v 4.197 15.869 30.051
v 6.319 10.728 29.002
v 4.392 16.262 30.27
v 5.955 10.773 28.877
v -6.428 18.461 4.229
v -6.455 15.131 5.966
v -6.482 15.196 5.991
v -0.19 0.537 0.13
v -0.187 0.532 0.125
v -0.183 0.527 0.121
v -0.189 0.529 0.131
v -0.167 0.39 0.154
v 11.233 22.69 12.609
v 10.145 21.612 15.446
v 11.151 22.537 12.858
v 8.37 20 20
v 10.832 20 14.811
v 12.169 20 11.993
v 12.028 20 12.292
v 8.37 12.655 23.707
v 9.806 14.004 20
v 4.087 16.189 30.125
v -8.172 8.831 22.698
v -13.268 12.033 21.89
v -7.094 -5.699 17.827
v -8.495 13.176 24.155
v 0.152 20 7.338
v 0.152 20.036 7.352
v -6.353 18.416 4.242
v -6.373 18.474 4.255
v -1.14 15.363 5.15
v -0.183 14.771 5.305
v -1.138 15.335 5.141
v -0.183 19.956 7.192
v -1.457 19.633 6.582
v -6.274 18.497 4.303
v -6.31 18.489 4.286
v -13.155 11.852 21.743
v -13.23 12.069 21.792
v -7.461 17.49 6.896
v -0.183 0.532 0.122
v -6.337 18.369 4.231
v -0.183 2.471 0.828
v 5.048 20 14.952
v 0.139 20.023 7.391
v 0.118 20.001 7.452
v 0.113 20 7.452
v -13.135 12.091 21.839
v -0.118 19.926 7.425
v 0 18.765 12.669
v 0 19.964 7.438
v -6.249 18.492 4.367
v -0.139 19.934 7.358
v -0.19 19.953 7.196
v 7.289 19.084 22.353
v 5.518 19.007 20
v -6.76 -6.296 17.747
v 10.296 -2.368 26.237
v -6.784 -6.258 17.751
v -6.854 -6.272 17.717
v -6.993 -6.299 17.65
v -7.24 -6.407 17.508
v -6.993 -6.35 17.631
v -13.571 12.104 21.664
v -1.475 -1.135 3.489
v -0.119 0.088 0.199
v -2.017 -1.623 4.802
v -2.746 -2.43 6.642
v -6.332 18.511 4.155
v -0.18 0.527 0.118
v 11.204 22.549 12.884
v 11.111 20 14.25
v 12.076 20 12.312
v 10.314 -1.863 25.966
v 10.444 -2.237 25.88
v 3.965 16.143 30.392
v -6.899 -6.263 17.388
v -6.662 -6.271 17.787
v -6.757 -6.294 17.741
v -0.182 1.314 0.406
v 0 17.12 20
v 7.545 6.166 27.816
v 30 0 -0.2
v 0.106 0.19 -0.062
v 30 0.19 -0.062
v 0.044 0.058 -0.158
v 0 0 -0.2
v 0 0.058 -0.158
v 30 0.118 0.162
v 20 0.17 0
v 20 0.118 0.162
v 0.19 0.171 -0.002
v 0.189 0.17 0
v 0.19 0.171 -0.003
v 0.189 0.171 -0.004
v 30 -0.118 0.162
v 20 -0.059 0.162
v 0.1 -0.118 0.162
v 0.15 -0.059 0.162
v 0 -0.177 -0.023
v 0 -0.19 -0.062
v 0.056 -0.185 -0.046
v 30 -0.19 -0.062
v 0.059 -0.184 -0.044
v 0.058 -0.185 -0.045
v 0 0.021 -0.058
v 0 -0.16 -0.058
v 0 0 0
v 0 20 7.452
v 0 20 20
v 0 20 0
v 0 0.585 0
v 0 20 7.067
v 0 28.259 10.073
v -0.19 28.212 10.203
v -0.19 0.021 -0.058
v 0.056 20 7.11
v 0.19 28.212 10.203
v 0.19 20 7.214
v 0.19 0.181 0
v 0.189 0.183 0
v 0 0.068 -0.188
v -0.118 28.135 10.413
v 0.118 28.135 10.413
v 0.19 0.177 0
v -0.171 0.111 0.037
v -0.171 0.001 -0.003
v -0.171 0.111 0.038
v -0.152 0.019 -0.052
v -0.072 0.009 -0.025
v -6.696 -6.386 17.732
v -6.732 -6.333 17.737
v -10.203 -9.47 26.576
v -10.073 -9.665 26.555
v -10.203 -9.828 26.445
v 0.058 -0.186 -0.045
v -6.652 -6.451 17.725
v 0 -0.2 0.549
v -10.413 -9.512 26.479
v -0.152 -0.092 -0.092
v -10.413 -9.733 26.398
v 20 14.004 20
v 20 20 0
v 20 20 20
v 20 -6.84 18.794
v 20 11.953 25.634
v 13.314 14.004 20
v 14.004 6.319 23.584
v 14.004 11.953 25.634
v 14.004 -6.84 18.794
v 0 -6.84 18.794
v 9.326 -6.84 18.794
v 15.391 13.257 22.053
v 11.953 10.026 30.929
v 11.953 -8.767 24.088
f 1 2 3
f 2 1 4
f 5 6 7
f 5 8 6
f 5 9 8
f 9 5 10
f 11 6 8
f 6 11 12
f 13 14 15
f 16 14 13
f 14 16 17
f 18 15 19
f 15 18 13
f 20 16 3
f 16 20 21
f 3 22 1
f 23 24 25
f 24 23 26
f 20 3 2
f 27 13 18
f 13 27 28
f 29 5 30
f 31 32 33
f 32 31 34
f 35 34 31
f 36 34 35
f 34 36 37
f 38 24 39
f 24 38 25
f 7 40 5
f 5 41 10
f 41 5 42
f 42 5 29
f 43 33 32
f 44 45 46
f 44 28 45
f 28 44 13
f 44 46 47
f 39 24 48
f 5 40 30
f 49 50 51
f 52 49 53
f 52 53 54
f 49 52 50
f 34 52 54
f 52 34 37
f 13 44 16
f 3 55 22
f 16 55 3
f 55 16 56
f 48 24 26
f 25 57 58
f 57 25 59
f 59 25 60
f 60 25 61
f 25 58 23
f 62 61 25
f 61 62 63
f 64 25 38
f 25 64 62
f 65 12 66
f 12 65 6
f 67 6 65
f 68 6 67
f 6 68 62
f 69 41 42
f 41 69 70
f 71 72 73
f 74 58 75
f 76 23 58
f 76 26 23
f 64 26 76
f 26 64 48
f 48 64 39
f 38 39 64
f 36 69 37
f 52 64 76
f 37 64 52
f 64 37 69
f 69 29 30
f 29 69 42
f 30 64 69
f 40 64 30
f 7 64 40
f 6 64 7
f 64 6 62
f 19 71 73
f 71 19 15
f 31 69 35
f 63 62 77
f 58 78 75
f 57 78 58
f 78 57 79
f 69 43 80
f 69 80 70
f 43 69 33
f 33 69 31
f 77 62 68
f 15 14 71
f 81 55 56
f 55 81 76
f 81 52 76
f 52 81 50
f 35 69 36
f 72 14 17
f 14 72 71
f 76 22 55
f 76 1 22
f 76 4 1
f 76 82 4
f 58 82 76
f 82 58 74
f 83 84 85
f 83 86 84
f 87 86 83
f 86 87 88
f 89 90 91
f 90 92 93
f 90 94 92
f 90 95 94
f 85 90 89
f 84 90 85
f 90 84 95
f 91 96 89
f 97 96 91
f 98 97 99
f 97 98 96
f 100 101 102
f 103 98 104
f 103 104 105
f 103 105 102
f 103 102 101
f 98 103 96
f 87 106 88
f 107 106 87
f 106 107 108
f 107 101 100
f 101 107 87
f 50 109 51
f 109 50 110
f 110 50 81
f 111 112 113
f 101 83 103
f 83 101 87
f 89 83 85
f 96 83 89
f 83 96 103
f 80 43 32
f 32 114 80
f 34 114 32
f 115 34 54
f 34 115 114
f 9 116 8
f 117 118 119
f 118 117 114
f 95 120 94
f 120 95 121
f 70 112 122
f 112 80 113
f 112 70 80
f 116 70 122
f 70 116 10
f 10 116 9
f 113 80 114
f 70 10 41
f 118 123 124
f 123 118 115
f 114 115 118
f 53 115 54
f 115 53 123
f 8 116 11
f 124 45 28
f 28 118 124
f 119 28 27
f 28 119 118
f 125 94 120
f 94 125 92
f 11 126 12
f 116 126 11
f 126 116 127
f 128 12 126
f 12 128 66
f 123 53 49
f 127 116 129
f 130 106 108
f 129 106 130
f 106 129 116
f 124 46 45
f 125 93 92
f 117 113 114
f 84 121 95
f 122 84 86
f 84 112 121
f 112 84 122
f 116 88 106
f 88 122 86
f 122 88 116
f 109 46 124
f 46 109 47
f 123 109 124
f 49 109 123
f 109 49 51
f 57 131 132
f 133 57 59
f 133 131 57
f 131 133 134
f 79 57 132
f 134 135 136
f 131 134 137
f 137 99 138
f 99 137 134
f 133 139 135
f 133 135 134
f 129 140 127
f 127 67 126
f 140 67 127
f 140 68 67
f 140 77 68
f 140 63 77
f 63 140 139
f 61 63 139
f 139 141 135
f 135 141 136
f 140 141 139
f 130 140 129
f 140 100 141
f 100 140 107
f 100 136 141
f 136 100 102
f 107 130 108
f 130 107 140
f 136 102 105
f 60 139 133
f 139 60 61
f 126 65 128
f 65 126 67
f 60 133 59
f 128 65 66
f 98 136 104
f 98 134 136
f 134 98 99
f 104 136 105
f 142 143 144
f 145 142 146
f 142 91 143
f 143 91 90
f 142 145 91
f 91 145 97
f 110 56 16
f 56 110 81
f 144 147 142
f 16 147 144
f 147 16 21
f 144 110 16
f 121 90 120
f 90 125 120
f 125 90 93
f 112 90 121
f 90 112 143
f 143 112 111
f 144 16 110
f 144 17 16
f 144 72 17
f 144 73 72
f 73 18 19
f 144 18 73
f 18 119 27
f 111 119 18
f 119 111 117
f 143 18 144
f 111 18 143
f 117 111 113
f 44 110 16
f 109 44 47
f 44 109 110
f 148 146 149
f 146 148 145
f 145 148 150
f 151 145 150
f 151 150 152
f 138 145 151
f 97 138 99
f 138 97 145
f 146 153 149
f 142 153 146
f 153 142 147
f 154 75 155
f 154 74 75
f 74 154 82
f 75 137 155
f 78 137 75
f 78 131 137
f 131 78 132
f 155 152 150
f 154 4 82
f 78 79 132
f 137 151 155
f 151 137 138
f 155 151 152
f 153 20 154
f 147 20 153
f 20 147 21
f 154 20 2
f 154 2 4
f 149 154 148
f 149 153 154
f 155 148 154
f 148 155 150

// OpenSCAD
// file: config.scad
$fa = $preview ? 12 : 1;
$fs = $preview ? 2 : 0.4;

choc_key_x = 18;
choc_key_y = 17;
pcbAndHotswapThikness = 3;
caseThikness = 2.5;
wallOffsetFromPcb = 1;
wallOffsetFromConnector = 3;
tentingAngle = 60;
keysThikness = 11;
caseColor = "grey";
pcbColor = "darkgreen";
keysColor = "white";
screwBumpSize = 2.5;

niceNanoCutoutDepth = 8;
switchPlateCutout = 13.8;
switchPlateCutoutDepth = 2.2;
extensionWidth = 60 + (caseThikness + wallOffsetFromPcb) * 2;
extensionLength = 90;
extensionShift = 11 - caseThikness - wallOffsetFromPcb;
pcbWidth = 90;
cutter = 400;

ccFarWall = 120;
ccFrontWall = 5 + caseThikness;
ccBackWall = 58 + ccFrontWall + caseThikness;

magnetStripeWidth = 26;
magnetStripeDepth = 0.7;
// legs
legRubberDepth = 1;
legRubberDiameter = 8;
legsInsideDepth = caseThikness;
legsTotalThickness = caseThikness + legsInsideDepth + legRubberDepth;

// case to case mounting
screwHoleDiameter = 2.3;
// main file
use <./lib.scad>

// notice how each subsequent cube is rotated relative to the previous one's axis
// that is not easy to get using plain rotate() function
// but it is crucial to make rotation humanely predictable if you are
// rotating on 3 axis and do not want one axis to affect another
// sequenceRotate() and sequenceRotateFn() doing the same thing, one is just more readable and easier to debug.
// while sequenceRotateFn() is more flexible and can be used as a parameter to other functions
cubeSize = [ 20, 20, 20 ];
x = 20;
y = -20;
z = 20;
rotateSequence = [ x, y, z ];

color("white") sequenceRotate(rotateSequence) cube(cubeSize);
echo(sequenceRotateFn(rotateSequence));
color("black") moveRotateTranslate(sequenceRotateFn(rotateSequence)) cube(cubeSize);

xAxis = [ 1, 0, 0 ];
yAxis = [ 0, 1, 0 ];
zAxis = [ 0, 0, 1 ];

color("green") sequenceRotate([ 0, 0, 0 ]) showVector(xAxis * 30);
color("red") sequenceRotate([ x, 0, 0 ]) showVector(yAxis * 30);
color("blue") sequenceRotate([ x, y, 0 ]) showVector(zAxis * 30);

color("green") sequenceRotate([ 0, 0, 0 ]) cube(cubeSize);
color("red") sequenceRotate([ x, 0, 0 ]) cube(cubeSize);
color("blue") sequenceRotate([ x, y, 0 ]) cube(cubeSize);
